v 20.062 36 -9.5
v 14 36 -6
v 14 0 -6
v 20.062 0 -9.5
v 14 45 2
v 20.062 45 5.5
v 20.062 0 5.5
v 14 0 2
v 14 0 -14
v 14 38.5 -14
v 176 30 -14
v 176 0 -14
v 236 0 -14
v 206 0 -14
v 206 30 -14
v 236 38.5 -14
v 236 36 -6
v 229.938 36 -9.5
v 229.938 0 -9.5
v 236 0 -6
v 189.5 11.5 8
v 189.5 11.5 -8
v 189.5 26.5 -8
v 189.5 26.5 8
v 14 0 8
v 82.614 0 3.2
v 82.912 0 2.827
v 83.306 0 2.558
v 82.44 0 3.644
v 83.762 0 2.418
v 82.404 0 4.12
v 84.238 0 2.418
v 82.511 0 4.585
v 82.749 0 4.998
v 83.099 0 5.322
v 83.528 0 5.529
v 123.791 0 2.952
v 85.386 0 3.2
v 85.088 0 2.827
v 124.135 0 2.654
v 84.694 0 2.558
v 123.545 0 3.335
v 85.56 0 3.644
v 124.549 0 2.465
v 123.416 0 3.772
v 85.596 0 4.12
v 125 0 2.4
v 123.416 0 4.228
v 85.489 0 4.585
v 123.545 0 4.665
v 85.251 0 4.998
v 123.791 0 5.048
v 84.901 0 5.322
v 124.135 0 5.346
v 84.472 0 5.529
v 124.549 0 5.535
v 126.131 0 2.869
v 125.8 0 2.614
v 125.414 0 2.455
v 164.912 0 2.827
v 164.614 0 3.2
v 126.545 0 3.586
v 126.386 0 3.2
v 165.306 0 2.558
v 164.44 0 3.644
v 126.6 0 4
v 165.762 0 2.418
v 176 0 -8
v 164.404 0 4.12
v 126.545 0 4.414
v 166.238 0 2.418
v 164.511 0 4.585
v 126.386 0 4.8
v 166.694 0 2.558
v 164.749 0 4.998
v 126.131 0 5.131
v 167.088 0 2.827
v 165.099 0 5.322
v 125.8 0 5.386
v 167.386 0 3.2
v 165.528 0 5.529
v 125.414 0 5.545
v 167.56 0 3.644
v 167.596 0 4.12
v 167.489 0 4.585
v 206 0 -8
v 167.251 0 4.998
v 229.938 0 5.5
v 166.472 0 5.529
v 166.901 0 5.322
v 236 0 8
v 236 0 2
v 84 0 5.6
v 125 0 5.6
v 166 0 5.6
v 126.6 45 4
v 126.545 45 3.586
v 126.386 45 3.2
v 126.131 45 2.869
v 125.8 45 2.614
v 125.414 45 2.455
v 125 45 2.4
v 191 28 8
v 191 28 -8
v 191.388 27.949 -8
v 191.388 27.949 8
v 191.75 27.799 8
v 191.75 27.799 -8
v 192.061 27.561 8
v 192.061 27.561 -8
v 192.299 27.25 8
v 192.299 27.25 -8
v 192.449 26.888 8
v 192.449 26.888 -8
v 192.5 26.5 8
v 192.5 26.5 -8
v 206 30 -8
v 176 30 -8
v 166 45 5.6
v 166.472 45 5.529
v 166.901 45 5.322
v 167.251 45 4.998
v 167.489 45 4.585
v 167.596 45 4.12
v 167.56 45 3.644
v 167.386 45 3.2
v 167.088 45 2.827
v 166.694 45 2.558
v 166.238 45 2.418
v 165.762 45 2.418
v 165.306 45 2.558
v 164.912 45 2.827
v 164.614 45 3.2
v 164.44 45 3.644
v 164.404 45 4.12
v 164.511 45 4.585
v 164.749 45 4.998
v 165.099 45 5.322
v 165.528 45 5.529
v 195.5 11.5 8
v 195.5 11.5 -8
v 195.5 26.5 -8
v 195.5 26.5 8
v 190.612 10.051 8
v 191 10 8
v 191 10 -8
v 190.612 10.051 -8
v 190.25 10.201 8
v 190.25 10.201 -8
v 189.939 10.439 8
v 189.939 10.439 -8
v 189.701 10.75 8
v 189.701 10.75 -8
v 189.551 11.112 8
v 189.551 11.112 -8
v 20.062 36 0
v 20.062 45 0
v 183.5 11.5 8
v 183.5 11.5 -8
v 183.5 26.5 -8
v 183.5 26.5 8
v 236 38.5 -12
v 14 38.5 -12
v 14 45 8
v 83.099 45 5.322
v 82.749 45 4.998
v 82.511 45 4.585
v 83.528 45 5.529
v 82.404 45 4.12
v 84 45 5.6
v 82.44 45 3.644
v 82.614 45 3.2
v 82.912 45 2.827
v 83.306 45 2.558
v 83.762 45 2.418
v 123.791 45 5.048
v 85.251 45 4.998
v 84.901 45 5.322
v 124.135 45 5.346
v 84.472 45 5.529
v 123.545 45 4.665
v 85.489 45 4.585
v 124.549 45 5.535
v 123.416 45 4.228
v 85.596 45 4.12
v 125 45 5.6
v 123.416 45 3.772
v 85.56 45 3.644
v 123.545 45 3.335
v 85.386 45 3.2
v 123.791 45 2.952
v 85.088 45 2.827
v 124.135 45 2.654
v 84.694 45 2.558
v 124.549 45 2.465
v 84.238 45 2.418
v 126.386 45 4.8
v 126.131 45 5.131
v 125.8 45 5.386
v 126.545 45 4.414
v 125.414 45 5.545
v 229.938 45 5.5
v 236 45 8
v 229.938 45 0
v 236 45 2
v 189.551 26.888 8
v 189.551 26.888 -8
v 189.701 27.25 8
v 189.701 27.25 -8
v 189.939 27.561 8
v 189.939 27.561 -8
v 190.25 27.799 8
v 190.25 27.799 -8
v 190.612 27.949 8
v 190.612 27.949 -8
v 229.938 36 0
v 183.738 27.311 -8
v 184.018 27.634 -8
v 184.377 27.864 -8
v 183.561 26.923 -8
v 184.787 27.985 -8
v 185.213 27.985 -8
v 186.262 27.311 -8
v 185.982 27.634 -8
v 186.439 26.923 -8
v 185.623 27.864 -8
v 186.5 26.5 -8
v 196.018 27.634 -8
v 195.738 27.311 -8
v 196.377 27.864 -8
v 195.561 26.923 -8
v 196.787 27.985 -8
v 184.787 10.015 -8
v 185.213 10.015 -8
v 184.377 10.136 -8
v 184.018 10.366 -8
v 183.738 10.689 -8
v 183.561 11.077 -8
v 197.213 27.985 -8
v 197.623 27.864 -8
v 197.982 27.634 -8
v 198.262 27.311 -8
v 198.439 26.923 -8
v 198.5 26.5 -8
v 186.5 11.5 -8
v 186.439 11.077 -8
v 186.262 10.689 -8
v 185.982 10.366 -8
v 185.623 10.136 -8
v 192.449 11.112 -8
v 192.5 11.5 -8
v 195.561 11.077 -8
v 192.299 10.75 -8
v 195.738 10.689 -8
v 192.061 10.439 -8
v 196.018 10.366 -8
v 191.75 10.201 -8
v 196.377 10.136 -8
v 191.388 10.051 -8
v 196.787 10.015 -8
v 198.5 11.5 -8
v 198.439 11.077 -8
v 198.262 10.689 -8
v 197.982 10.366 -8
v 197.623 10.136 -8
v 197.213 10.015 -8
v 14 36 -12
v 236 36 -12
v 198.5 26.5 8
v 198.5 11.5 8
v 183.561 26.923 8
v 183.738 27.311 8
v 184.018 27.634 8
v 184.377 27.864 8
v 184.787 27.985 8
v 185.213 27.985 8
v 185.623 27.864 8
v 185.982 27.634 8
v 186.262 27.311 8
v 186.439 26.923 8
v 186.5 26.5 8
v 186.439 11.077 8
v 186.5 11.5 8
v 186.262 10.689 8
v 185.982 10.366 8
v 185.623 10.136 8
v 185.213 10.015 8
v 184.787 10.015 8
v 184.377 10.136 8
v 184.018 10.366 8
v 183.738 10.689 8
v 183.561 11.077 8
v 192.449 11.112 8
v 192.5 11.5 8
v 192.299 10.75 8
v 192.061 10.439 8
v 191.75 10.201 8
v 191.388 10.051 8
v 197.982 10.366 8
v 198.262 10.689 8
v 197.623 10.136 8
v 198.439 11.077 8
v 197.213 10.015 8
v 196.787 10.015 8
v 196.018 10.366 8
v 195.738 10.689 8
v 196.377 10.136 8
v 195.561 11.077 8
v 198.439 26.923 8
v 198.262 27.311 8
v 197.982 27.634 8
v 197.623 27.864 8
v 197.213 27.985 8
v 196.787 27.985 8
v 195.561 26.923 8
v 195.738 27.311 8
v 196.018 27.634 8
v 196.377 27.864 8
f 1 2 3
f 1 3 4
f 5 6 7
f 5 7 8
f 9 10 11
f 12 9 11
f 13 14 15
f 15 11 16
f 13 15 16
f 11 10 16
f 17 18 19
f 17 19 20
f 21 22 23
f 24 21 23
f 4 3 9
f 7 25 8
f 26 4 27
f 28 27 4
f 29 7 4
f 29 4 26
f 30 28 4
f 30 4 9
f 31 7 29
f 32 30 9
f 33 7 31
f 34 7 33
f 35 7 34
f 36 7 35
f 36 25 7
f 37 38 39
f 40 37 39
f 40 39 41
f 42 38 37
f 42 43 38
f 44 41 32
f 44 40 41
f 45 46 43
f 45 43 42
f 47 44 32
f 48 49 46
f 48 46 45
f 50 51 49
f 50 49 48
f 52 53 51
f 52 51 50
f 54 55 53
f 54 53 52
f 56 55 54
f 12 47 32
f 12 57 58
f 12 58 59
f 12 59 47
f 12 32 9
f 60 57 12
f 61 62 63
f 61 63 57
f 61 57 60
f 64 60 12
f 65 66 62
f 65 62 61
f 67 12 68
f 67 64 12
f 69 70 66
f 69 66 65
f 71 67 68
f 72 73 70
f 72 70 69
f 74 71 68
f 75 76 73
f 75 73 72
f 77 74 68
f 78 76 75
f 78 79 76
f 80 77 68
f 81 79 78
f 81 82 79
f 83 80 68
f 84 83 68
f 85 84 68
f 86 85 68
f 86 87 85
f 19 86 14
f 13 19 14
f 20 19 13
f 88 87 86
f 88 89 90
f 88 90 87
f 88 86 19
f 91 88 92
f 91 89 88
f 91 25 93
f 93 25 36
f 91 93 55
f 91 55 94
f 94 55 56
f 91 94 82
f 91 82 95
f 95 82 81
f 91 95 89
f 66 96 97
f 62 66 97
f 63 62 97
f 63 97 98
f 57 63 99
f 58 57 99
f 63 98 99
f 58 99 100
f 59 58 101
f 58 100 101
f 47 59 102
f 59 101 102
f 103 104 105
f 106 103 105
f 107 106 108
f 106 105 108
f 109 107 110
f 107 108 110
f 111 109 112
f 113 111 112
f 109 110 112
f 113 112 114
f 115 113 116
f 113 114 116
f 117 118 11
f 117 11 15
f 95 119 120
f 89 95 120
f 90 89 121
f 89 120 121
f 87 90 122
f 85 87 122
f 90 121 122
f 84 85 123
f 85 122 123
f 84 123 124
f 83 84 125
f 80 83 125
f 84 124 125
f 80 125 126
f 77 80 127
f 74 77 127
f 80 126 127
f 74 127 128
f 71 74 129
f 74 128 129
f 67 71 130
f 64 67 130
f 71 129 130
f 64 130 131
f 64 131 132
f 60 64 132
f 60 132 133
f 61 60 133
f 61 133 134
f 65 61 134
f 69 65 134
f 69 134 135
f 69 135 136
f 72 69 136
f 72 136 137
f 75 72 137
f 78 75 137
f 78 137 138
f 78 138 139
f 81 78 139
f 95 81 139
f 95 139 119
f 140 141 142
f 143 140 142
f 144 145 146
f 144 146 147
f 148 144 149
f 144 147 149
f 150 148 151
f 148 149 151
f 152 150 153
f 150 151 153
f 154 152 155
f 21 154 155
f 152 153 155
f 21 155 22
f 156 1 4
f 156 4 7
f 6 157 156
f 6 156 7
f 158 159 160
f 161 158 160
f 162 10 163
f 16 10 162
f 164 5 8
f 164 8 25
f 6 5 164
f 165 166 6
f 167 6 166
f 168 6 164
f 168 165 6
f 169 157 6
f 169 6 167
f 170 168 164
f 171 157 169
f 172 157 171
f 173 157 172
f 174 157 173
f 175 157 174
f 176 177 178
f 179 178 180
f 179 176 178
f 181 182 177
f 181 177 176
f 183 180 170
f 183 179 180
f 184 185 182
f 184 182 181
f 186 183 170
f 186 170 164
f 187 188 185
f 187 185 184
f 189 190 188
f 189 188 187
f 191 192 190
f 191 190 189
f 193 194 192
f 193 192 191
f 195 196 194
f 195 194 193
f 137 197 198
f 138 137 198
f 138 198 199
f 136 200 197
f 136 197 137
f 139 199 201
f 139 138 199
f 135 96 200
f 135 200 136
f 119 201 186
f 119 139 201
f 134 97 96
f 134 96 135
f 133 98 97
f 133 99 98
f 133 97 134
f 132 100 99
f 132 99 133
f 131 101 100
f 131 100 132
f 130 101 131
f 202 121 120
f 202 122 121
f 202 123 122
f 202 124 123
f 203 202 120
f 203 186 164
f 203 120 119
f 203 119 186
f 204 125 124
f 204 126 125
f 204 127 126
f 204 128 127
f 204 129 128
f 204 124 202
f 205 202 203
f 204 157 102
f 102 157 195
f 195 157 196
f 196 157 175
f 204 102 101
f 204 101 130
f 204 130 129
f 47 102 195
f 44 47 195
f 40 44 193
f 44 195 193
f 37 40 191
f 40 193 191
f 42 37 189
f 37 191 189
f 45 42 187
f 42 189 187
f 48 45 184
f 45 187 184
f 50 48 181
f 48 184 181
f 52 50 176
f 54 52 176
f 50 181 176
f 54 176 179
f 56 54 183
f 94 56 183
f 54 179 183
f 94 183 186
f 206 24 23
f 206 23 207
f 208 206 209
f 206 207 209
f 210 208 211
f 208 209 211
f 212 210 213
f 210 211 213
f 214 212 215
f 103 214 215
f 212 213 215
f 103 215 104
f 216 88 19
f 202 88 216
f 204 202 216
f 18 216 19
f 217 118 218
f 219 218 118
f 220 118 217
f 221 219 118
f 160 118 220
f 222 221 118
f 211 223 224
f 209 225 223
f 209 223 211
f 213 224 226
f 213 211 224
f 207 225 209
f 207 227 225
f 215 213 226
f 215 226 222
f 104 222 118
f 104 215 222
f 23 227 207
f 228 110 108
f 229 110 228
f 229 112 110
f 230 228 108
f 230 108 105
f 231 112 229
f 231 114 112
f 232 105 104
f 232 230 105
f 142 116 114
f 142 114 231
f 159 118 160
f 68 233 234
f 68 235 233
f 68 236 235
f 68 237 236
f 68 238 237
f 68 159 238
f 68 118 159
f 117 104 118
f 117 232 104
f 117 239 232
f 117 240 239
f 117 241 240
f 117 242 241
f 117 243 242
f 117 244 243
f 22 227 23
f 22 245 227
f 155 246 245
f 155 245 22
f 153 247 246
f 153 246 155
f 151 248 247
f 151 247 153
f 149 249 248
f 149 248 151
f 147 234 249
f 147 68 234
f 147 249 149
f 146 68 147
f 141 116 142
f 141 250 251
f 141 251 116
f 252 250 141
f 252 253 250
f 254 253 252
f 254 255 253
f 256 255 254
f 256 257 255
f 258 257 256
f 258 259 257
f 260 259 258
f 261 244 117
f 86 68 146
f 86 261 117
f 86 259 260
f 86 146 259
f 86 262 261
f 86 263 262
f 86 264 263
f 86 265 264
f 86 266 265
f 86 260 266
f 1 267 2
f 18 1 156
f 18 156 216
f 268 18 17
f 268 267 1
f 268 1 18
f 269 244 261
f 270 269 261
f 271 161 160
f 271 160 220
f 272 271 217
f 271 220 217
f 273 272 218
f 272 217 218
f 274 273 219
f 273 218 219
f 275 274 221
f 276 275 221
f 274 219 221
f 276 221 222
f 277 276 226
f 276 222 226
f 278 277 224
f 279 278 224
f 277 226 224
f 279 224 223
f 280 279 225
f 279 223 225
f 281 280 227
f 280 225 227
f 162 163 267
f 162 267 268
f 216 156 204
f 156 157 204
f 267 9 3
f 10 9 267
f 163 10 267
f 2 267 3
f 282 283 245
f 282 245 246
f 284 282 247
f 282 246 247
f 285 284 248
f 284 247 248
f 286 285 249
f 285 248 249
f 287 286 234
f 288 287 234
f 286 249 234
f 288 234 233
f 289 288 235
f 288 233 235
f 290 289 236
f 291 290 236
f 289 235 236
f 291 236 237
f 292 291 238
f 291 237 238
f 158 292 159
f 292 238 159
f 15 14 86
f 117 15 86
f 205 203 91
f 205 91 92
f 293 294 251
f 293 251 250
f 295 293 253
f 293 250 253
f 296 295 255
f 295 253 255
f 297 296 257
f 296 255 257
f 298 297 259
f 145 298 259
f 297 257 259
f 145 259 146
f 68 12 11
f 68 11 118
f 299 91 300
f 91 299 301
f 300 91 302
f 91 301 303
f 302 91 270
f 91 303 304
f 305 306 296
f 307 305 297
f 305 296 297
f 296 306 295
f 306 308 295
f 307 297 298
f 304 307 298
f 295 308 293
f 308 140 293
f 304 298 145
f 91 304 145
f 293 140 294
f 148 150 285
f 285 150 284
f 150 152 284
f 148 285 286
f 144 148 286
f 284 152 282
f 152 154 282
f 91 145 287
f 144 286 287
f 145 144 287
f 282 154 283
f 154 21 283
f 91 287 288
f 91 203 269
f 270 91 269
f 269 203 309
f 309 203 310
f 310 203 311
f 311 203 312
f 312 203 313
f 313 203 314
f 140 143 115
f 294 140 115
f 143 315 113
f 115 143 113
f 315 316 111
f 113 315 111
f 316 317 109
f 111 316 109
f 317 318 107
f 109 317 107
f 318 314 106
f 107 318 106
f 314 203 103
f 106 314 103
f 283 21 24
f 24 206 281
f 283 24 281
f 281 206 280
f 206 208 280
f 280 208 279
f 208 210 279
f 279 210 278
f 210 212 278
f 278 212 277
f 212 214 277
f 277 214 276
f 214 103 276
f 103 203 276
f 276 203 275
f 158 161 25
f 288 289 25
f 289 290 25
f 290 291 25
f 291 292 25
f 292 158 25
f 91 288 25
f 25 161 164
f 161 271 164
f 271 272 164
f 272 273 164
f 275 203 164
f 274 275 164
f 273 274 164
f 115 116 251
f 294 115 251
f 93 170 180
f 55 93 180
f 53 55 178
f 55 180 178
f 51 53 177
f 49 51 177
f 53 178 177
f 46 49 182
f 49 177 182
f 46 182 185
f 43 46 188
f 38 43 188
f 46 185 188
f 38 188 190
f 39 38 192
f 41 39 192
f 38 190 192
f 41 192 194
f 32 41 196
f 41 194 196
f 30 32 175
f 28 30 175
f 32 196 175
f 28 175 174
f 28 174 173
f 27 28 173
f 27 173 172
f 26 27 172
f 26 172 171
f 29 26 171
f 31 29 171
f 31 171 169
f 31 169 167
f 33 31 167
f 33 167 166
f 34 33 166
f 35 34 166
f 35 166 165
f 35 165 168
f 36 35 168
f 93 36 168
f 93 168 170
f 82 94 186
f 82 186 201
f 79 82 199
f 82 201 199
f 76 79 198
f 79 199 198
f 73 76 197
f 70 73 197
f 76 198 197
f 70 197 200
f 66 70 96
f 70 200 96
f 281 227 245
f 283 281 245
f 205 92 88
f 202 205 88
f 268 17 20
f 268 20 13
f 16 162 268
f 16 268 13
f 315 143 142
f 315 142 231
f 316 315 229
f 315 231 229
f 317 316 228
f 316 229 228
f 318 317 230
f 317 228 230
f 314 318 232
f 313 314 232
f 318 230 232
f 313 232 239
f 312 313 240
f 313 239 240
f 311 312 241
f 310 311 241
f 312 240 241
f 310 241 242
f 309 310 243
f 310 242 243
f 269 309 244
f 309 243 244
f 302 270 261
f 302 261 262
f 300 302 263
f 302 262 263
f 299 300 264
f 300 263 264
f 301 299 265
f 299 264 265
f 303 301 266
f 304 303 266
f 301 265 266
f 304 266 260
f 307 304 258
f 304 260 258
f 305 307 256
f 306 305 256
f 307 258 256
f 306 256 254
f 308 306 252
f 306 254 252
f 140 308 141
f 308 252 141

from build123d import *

# Parameters (mm, degrees)
SKETCH_1_W           = 270
SKETCH_1_H           = 370
SKETCH_1_W_2         = 250
SKETCH_1_H_2         = 350
EXTRUDE_2_DEPTH      = 45
SKETCH_4_W           = 250
SKETCH_4_H           = 350
SKETCH_4_W_2         = 222
SKETCH_4_H_2         = 322
EXTRUDE_3_DEPTH      = 5
SKETCH_9_W           = 246
SKETCH_9_H           = 346
SKETCH_9_W_2         = 226
SKETCH_9_H_2         = 326
CUT_EXTRUDE_3_DEPTH  = 2.5
SKETCH_12_R          = 1.6
CUT_EXTRUDE_5_DEPTH  = 109.5
FILLET_1_R           = 5
SKETCH_13_W          = 250
SKETCH_13_H          = 350
SKETCH_13_W_2        = 222
SKETCH_13_H_2        = 322
EXTRUDE_4_DEPTH      = 33.5
CUT_EXTRUDE_START    = -126.5
SKETCH_14_R          = 1.6
CUT_EXTRUDE_8_DEPTH  = 126.5
SKETCH_15_W          = 209.875644348
SKETCH_15_H          = 2
CUT_EXTRUDE_9_DEPTH  = 2.5
CUT_EXTRUDE_10_DEPTH = 60.5
SKETCH_18_R          = 1.6
CUT_EXTRUDE_11_DEPTH = 60.5
SKETCH_19_W          = 30
SKETCH_19_H          = 6
CUT_EXTRUDE_12_DEPTH = 30
CUT_EXTRUDE_13_DEPTH = 30
CUT_EXTRUDE_14_DEPTH = 55


with BuildPart() as part:
    # 草图1 → 凸台-拉伸2 (new body)
    with BuildSketch(Plane(origin=(0, 0, 0), x_dir=(1, 0, 0), z_dir=(0, 1, 0))):
        with Locations((125, 175)):
            Rectangle(SKETCH_1_W, SKETCH_1_H)
        with Locations((125, 175)):
            Rectangle(SKETCH_1_W_2, SKETCH_1_H_2, mode=Mode.SUBTRACT)
    extrude(amount=EXTRUDE_2_DEPTH)

    # 草图4 → 凸台-拉伸3 (add)
    with BuildSketch(Plane(origin=(0, 38.5, 0), x_dir=(1, 0, 0), z_dir=(0, 1, 0))):
        with Locations((125, 175)):
            Rectangle(SKETCH_4_W, SKETCH_4_H)
        with Locations((125, 175)):
            Rectangle(SKETCH_4_W_2, SKETCH_4_H_2, mode=Mode.SUBTRACT)
    extrude(amount=-EXTRUDE_3_DEPTH)

    # 草图9 → 切除-拉伸3 (cut)
    with BuildSketch(Plane(origin=(0, 38.5, 0), x_dir=(1, 0, 0), z_dir=(0, 1, 0))):
        with Locations((125, 175)):
            Rectangle(SKETCH_9_W, SKETCH_9_H)
        with Locations((125, 175)):
            Rectangle(SKETCH_9_W_2, SKETCH_9_H_2, mode=Mode.SUBTRACT)
    extrude(amount=-CUT_EXTRUDE_3_DEPTH, mode=Mode.SUBTRACT)

    # 草图12 → 切除-拉伸5 (cut)
    with BuildSketch(Plane(origin=(0, 45, 0), x_dir=(1, 0, 0), z_dir=(0, 1, 0))):
        with Locations(Location((-5, -5, 0), (0, 0, 270))):
            Circle(SKETCH_12_R)
        with BuildLine():
            ThreePointArc((-6.13137085, 356.13137085), (-6.13137085, 353.86862915), (-3.86862915, 353.86862915))
            Line((-3.86862915, 353.86862915), (-6.13137085, 356.13137085))
        make_face()
        with BuildLine():
            Line((-6.13137085, 356.13137085), (-3.86862915, 353.86862915))
            ThreePointArc((-3.86862915, 353.86862915), (-3.521792748, 354.387706508), (-3.4, 355))
            ThreePointArc((-3.4, 355), (-4.387706508, 356.478207252), (-6.13137085, 356.13137085))
        make_face()
        with Locations(Location((255, 355, 0), (0, 0, 270))):
            Circle(SKETCH_12_R)
        with Locations(Location((255, -5, 0), (0, 0, 270))):
            Circle(SKETCH_12_R)
    extrude(amount=-CUT_EXTRUDE_5_DEPTH, mode=Mode.SUBTRACT)

    # 圆角1
    fillet_1_edges = [part.edges().sort_by_distance(p)[0] for p in [
        (-10, 22.5, 10),
        (-10, 22.5, -360),
        (260, 22.5, -360),
        (260, 22.5, 10),
    ]]
    fillet(fillet_1_edges, radius=FILLET_1_R)

    # 草图13 → 凸台-拉伸4 (add)
    with BuildSketch(Plane.XZ.offset(-33.5)):
        with Locations((125, -175)):
            Rectangle(SKETCH_13_W, SKETCH_13_H)
        with Locations((125, -175)):
            Rectangle(SKETCH_13_W_2, SKETCH_13_H_2, mode=Mode.SUBTRACT)
    extrude(amount=EXTRUDE_4_DEPTH)

    # 草图14 → 切除-拉伸8 (cut)
    # profile 1 of 7: a face of its own
    with BuildSketch(Plane.XZ.offset(CUT_EXTRUDE_START)):
        with BuildLine():
            Line((14, -336), (14, -14))
            Line((14, -14), (14, -6))
            Line((14, -6), (14, 2))
            Line((14, 2), (14, 10))
            Line((14, 10), (-5, 10))
            ThreePointArc((-5, 10), (-8.535533906, 8.535533906), (-10, 5))
            Line((-10, 5), (-10, -355))
            ThreePointArc((-10, -355), (-8.535533906, -358.535533906), (-5, -360))
            Line((-5, -360), (255, -360))
            ThreePointArc((255, -360), (258.535533906, -358.535533906), (260, -355))
            Line((260, -355), (260, 5))
            ThreePointArc((260, 5), (258.535533906, 8.535533906), (255, 10))
            Line((255, 10), (236, 10))
            Line((236, 10), (236, 2))
            Line((236, 2), (236, -6))
            Line((236, -6), (236, -14))
            Line((236, -14), (236, -336))
            Line((236, -336), (14, -336))
        make_face()
        with Locations((-5, -355)):
            Circle(SKETCH_14_R, mode=Mode.SUBTRACT)
        with Locations((255, -355)):
            Circle(SKETCH_14_R, mode=Mode.SUBTRACT)
        with Locations((-5, 5)):
            Circle(SKETCH_14_R, mode=Mode.SUBTRACT)
        with Locations((255, 5)):
            Circle(SKETCH_14_R, mode=Mode.SUBTRACT)
    # profile 2 of 7: a face of its own
    with BuildSketch(Plane.XZ.offset(CUT_EXTRUDE_START)):
        Polygon((14, 2), (14, -6), (20.062177826, -9.5), (20.062177826, 5.5), align=None)
    # profile 3 of 7: a face of its own
    with BuildSketch(Plane.XZ.offset(CUT_EXTRUDE_START)):
        with Locations((-5, 5)):
            Circle(SKETCH_14_R)
    # profile 4 of 7: a face of its own
    with BuildSketch(Plane.XZ.offset(CUT_EXTRUDE_START)):
        Polygon((229.937822174, -9.5), (236, -6), (236, 2), (229.937822174, 5.5), align=None)
    # profile 5 of 7: a face of its own
    with BuildSketch(Plane.XZ.offset(CUT_EXTRUDE_START)):
        with Locations((255, 5)):
            Circle(SKETCH_14_R)
    # profile 6 of 7: a face of its own
    with BuildSketch(Plane.XZ.offset(CUT_EXTRUDE_START)):
        with Locations((255, -355)):
            Circle(SKETCH_14_R)
    # profile 7 of 7: a face of its own
    with BuildSketch(Plane.XZ.offset(CUT_EXTRUDE_START)):
        with Locations((-5, -355)):
            Circle(SKETCH_14_R)
    extrude(amount=CUT_EXTRUDE_8_DEPTH, mode=Mode.SUBTRACT)

    # 草图15 → 切除-拉伸9 (cut)
    with BuildSketch(Plane(origin=(0, 38.5, 0), x_dir=(1, 0, 0), z_dir=(0, 1, 0))):
        with Locations((125, 1)):
            Rectangle(SKETCH_15_W, SKETCH_15_H)
    extrude(amount=-CUT_EXTRUDE_9_DEPTH, mode=Mode.SUBTRACT)

    # 草图16 → 切除-拉伸10 (cut)
    with BuildSketch(Plane(origin=(0, 45, 0), x_dir=(1, 0, 0), z_dir=(0, 1, 0))):
        Polygon((236, -10), (236, -8), (234, -8), (229.607695155, -8), (14, -8), (14, -10), align=None)
    extrude(amount=-CUT_EXTRUDE_10_DEPTH, mode=Mode.SUBTRACT)

    # 草图18 → 切除-拉伸11 (cut)
    with BuildSketch(Plane(origin=(0, 45, 0), x_dir=(1, 0, 0), z_dir=(0, 1, 0))):
        with Locations(Location((166, -4, 0), (0, 0, 270))):
            Circle(SKETCH_18_R)
        with Locations(Location((84, -4, 0), (0, 0, 270))):
            Circle(SKETCH_18_R)
    extrude(amount=-CUT_EXTRUDE_11_DEPTH, mode=Mode.SUBTRACT)

    # 草图19 → 切除-拉伸12 (cut)
    with BuildSketch(Plane.XZ):
        with Locations((191, -11)):
            Rectangle(SKETCH_19_W, SKETCH_19_H)
    extrude(amount=-CUT_EXTRUDE_12_DEPTH, mode=Mode.SUBTRACT)

    # 草图20 → 切除-拉伸13 (cut)
    with BuildSketch(Plane(origin=(0, 0, -8), x_dir=(-1, 0, 0), z_dir=(0, 0, -1))):
        with BuildLine():
            Line((-198.5, 26.5), (-198.5, 19))
            Line((-198.5, 19), (-195.5, 19))
            Line((-195.5, 19), (-195.5, 26.5))
            ThreePointArc((-195.5, 26.5), (-197, 28), (-198.5, 26.5))
        make_face()
        with BuildLine():
            Line((-195.5, 19), (-198.5, 19))
            Line((-198.5, 19), (-198.5, 11.5))
            ThreePointArc((-198.5, 11.5), (-197, 10), (-195.5, 11.5))
            Line((-195.5, 11.5), (-195.5, 19))
        make_face()
        with BuildLine():
            Line((-191, 10), (-191, 19))
            Line((-191, 19), (-192.5, 19))
            Line((-192.5, 19), (-192.5, 11.5))
            ThreePointArc((-192.5, 11.5), (-192.060660172, 10.439339828), (-191, 10))
        make_face()
        with BuildLine():
            Line((-189.5, 19), (-191, 19))
            Line((-191, 19), (-191, 10))
            ThreePointArc((-191, 10), (-189.939339828, 10.439339828), (-189.5, 11.5))
            Line((-189.5, 11.5), (-189.5, 19))
        make_face()
        with BuildLine():
            ThreePointArc((-189.5, 26.5), (-189.939339828, 27.560660172), (-191, 28))
            Line((-191, 28), (-191, 19))
            Line((-191, 19), (-189.5, 19))
            Line((-189.5, 19), (-189.5, 26.5))
        make_face()
        with BuildLine():
            Line((-191, 19), (-191, 28))
            ThreePointArc((-191, 28), (-192.060660172, 27.560660172), (-192.5, 26.5))
            Line((-192.5, 26.5), (-192.5, 19))
            Line((-192.5, 19), (-191, 19))
        make_face()
        with BuildLine():
            Line((-186.5, 19), (-183.5, 19))
            Line((-183.5, 19), (-183.5, 26.5))
            ThreePointArc((-183.5, 26.5), (-185, 28), (-186.5, 26.5))
            Line((-186.5, 26.5), (-186.5, 19))
        make_face()
        with BuildLine():
            Line((-183.5, 11.5), (-183.5, 19))
            Line((-183.5, 19), (-186.5, 19))
            Line((-186.5, 19), (-186.5, 11.5))
            ThreePointArc((-186.5, 11.5), (-185, 10), (-183.5, 11.5))
        make_face()
    extrude(amount=-CUT_EXTRUDE_13_DEPTH, mode=Mode.SUBTRACT)

    # 草图22 → 切除-拉伸14 (cut)
    with BuildSketch(Plane(origin=(0, 45, 0), x_dir=(1, 0, 0), z_dir=(0, 1, 0))):
        with BuildLine():
            ThreePointArc((126.6, -4), (126.13137085, -2.86862915), (125, -2.4))
            Line((125, -2.4), (125, -5.6))
            ThreePointArc((125, -5.6), (126.13137085, -5.13137085), (126.6, -4))
        make_face()
        with BuildLine():
            Line((125, -5.6), (125, -2.4))
            ThreePointArc((125, -2.4), (123.4, -4), (125, -5.6))
        make_face()
    extrude(amount=-CUT_EXTRUDE_14_DEPTH, mode=Mode.SUBTRACT)


solid = part.part
